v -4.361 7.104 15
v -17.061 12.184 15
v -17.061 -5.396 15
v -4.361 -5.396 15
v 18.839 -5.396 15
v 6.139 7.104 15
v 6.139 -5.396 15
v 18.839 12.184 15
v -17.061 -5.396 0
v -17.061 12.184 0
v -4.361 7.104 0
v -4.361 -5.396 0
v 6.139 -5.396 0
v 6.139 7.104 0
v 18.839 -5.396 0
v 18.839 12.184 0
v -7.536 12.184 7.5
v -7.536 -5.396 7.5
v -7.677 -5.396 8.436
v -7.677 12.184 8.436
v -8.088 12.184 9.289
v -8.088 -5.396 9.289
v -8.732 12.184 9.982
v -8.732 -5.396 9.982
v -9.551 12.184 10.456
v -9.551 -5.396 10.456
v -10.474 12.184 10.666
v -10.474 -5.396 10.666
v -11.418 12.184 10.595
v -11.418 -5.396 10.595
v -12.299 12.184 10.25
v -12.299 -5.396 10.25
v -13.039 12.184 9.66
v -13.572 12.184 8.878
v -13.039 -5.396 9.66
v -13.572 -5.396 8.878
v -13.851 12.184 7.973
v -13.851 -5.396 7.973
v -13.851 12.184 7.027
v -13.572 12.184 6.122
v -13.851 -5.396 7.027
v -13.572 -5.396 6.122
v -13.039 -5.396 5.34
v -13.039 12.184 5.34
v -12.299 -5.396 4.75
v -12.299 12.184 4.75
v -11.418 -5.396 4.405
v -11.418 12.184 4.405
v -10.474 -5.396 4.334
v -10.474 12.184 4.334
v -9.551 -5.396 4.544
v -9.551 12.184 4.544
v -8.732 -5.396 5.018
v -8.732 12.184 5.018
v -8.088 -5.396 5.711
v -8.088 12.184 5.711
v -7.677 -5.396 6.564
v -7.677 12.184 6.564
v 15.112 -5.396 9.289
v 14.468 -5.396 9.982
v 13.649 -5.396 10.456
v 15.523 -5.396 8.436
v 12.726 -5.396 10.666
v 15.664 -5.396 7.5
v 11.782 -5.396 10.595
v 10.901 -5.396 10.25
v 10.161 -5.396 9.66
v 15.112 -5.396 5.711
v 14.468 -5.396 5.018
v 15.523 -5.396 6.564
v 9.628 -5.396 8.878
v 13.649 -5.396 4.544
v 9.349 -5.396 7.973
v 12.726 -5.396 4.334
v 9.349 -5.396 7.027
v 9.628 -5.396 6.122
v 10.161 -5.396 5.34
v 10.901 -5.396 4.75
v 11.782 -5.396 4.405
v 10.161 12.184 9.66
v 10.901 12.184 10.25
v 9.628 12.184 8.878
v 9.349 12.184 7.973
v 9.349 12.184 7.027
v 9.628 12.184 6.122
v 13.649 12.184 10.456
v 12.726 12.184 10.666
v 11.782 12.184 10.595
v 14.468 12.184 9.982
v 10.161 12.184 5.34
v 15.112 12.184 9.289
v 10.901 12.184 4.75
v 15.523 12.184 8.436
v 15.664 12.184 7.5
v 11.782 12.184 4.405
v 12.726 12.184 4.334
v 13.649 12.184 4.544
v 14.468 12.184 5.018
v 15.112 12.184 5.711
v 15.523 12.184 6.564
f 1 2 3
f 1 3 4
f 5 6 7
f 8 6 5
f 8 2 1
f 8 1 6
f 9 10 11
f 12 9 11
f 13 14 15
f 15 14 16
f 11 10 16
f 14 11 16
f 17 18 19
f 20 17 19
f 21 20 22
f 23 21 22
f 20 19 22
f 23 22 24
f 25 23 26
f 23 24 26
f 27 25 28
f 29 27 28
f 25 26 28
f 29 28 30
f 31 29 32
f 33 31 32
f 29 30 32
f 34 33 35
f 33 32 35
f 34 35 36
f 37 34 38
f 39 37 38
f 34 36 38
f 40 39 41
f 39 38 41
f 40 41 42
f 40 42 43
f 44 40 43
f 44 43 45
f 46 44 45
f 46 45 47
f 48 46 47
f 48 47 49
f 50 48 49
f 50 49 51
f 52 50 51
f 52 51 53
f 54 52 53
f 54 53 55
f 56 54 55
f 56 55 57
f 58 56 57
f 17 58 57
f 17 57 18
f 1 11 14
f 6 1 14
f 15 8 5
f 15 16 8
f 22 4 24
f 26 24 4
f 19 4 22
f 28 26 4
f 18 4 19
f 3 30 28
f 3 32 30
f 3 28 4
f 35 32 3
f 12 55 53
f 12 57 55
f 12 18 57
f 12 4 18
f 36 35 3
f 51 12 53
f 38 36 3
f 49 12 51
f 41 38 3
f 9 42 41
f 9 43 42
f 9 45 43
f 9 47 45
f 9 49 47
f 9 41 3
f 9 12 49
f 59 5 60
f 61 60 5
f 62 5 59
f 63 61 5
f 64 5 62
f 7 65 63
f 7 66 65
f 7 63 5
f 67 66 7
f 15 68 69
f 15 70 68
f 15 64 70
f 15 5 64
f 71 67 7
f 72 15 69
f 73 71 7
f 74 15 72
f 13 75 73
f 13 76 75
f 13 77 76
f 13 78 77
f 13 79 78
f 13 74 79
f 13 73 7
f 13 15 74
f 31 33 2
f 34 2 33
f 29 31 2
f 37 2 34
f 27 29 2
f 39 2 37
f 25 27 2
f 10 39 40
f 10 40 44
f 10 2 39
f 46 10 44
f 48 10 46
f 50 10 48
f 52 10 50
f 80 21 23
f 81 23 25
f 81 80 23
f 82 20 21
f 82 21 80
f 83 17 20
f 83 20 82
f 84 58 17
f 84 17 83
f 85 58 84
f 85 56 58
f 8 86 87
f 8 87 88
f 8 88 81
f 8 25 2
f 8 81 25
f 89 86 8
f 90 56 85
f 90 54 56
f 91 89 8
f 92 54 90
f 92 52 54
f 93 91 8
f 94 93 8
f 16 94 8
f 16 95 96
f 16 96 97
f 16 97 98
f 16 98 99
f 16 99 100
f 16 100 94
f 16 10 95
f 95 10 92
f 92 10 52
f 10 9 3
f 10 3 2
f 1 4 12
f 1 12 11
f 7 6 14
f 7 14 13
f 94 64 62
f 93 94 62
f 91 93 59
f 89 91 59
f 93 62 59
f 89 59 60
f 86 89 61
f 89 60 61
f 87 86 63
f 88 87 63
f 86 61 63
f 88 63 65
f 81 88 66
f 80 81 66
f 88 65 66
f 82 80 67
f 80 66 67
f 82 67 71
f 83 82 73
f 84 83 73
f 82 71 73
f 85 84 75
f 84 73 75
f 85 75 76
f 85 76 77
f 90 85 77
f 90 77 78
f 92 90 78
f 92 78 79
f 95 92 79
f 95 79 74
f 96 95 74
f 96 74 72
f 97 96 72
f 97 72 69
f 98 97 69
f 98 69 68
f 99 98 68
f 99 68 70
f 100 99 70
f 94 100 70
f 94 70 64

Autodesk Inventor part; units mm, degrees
ref_plane "YZ Plane" through (0, 0, 0) normal (1, 0, 0) x (0, 1, 0)
ref_plane "XZ Plane" through (0, 0, 0) normal (0, 1, 0) x (-1, 0, 0)
ref_plane "XY Plane" through (0, 0, 0) normal (0, 0, 1) x (1, 0, 0)
sketch "Sketch1" plane through (0, 0, 0) normal (0, 0, 1) x (1, 0, 0)
  line L0 (-4.3614, 7.1036) -> (6.1386, 7.1036)
  line L1 (6.1386, 7.1036) -> (6.1386, -5.3964)
  line L2 (-4.3614, -5.3964) -> (-4.3614, 7.1036)
  line L3 (-4.3614, -5.3964) -> (-17.0614, -5.3964)
  line L4 (-4.3614, -5.3964) -> (8.3386, -5.3964) construction
  line L5 (-17.0614, -5.3964) -> (-17.0614, 12.1836)
  line L6 (-17.0614, 12.1836) -> (18.8386, 12.1836)
  line L7 (18.8386, 12.1836) -> (18.8386, -5.3964)
  line L8 (18.8386, -5.3964) -> (6.1386, -5.3964)
  point P0 (0, 0)
  dimension "d0" = 10.5
  dimension "d1" = 12.5
  dimension "d2" = 12.7
  dimension "d3" = 180
  dimension "d6" = 12.7
  dimension "d9" = 5.08
extrude "Extrusion1" add sketch "Sketch1" along normal blind 15
sketch "Sketch2" plane through (6.1386, -5.3964, 0) normal (0, -1, 0) x (1, 0, 0)
  circle A0 centre (6.35, 7.5) radius 3.175
  circle A1 centre (-16.85, 7.5) radius 3.175
  line L0 (0, 0) -> (12.7, 0) projected
  line L1 (-23.2, 0) -> (-23.2, 15) projected
  line L2 (-23.2, 15) -> (-10.5, 15) projected
  point P0 (-6.1386, 0)
  dimension "d12" = 6.35
  dimension "d13" = 6.35
  dimension "d14" = 7.5
  dimension "d15" = 6.35
  dimension "d16" = 6.35
  dimension "d17" = 7.5
extrude "Extrusion2" cut sketch "Sketch2" against normal blind 21.5125
properties part number "motor mount"
